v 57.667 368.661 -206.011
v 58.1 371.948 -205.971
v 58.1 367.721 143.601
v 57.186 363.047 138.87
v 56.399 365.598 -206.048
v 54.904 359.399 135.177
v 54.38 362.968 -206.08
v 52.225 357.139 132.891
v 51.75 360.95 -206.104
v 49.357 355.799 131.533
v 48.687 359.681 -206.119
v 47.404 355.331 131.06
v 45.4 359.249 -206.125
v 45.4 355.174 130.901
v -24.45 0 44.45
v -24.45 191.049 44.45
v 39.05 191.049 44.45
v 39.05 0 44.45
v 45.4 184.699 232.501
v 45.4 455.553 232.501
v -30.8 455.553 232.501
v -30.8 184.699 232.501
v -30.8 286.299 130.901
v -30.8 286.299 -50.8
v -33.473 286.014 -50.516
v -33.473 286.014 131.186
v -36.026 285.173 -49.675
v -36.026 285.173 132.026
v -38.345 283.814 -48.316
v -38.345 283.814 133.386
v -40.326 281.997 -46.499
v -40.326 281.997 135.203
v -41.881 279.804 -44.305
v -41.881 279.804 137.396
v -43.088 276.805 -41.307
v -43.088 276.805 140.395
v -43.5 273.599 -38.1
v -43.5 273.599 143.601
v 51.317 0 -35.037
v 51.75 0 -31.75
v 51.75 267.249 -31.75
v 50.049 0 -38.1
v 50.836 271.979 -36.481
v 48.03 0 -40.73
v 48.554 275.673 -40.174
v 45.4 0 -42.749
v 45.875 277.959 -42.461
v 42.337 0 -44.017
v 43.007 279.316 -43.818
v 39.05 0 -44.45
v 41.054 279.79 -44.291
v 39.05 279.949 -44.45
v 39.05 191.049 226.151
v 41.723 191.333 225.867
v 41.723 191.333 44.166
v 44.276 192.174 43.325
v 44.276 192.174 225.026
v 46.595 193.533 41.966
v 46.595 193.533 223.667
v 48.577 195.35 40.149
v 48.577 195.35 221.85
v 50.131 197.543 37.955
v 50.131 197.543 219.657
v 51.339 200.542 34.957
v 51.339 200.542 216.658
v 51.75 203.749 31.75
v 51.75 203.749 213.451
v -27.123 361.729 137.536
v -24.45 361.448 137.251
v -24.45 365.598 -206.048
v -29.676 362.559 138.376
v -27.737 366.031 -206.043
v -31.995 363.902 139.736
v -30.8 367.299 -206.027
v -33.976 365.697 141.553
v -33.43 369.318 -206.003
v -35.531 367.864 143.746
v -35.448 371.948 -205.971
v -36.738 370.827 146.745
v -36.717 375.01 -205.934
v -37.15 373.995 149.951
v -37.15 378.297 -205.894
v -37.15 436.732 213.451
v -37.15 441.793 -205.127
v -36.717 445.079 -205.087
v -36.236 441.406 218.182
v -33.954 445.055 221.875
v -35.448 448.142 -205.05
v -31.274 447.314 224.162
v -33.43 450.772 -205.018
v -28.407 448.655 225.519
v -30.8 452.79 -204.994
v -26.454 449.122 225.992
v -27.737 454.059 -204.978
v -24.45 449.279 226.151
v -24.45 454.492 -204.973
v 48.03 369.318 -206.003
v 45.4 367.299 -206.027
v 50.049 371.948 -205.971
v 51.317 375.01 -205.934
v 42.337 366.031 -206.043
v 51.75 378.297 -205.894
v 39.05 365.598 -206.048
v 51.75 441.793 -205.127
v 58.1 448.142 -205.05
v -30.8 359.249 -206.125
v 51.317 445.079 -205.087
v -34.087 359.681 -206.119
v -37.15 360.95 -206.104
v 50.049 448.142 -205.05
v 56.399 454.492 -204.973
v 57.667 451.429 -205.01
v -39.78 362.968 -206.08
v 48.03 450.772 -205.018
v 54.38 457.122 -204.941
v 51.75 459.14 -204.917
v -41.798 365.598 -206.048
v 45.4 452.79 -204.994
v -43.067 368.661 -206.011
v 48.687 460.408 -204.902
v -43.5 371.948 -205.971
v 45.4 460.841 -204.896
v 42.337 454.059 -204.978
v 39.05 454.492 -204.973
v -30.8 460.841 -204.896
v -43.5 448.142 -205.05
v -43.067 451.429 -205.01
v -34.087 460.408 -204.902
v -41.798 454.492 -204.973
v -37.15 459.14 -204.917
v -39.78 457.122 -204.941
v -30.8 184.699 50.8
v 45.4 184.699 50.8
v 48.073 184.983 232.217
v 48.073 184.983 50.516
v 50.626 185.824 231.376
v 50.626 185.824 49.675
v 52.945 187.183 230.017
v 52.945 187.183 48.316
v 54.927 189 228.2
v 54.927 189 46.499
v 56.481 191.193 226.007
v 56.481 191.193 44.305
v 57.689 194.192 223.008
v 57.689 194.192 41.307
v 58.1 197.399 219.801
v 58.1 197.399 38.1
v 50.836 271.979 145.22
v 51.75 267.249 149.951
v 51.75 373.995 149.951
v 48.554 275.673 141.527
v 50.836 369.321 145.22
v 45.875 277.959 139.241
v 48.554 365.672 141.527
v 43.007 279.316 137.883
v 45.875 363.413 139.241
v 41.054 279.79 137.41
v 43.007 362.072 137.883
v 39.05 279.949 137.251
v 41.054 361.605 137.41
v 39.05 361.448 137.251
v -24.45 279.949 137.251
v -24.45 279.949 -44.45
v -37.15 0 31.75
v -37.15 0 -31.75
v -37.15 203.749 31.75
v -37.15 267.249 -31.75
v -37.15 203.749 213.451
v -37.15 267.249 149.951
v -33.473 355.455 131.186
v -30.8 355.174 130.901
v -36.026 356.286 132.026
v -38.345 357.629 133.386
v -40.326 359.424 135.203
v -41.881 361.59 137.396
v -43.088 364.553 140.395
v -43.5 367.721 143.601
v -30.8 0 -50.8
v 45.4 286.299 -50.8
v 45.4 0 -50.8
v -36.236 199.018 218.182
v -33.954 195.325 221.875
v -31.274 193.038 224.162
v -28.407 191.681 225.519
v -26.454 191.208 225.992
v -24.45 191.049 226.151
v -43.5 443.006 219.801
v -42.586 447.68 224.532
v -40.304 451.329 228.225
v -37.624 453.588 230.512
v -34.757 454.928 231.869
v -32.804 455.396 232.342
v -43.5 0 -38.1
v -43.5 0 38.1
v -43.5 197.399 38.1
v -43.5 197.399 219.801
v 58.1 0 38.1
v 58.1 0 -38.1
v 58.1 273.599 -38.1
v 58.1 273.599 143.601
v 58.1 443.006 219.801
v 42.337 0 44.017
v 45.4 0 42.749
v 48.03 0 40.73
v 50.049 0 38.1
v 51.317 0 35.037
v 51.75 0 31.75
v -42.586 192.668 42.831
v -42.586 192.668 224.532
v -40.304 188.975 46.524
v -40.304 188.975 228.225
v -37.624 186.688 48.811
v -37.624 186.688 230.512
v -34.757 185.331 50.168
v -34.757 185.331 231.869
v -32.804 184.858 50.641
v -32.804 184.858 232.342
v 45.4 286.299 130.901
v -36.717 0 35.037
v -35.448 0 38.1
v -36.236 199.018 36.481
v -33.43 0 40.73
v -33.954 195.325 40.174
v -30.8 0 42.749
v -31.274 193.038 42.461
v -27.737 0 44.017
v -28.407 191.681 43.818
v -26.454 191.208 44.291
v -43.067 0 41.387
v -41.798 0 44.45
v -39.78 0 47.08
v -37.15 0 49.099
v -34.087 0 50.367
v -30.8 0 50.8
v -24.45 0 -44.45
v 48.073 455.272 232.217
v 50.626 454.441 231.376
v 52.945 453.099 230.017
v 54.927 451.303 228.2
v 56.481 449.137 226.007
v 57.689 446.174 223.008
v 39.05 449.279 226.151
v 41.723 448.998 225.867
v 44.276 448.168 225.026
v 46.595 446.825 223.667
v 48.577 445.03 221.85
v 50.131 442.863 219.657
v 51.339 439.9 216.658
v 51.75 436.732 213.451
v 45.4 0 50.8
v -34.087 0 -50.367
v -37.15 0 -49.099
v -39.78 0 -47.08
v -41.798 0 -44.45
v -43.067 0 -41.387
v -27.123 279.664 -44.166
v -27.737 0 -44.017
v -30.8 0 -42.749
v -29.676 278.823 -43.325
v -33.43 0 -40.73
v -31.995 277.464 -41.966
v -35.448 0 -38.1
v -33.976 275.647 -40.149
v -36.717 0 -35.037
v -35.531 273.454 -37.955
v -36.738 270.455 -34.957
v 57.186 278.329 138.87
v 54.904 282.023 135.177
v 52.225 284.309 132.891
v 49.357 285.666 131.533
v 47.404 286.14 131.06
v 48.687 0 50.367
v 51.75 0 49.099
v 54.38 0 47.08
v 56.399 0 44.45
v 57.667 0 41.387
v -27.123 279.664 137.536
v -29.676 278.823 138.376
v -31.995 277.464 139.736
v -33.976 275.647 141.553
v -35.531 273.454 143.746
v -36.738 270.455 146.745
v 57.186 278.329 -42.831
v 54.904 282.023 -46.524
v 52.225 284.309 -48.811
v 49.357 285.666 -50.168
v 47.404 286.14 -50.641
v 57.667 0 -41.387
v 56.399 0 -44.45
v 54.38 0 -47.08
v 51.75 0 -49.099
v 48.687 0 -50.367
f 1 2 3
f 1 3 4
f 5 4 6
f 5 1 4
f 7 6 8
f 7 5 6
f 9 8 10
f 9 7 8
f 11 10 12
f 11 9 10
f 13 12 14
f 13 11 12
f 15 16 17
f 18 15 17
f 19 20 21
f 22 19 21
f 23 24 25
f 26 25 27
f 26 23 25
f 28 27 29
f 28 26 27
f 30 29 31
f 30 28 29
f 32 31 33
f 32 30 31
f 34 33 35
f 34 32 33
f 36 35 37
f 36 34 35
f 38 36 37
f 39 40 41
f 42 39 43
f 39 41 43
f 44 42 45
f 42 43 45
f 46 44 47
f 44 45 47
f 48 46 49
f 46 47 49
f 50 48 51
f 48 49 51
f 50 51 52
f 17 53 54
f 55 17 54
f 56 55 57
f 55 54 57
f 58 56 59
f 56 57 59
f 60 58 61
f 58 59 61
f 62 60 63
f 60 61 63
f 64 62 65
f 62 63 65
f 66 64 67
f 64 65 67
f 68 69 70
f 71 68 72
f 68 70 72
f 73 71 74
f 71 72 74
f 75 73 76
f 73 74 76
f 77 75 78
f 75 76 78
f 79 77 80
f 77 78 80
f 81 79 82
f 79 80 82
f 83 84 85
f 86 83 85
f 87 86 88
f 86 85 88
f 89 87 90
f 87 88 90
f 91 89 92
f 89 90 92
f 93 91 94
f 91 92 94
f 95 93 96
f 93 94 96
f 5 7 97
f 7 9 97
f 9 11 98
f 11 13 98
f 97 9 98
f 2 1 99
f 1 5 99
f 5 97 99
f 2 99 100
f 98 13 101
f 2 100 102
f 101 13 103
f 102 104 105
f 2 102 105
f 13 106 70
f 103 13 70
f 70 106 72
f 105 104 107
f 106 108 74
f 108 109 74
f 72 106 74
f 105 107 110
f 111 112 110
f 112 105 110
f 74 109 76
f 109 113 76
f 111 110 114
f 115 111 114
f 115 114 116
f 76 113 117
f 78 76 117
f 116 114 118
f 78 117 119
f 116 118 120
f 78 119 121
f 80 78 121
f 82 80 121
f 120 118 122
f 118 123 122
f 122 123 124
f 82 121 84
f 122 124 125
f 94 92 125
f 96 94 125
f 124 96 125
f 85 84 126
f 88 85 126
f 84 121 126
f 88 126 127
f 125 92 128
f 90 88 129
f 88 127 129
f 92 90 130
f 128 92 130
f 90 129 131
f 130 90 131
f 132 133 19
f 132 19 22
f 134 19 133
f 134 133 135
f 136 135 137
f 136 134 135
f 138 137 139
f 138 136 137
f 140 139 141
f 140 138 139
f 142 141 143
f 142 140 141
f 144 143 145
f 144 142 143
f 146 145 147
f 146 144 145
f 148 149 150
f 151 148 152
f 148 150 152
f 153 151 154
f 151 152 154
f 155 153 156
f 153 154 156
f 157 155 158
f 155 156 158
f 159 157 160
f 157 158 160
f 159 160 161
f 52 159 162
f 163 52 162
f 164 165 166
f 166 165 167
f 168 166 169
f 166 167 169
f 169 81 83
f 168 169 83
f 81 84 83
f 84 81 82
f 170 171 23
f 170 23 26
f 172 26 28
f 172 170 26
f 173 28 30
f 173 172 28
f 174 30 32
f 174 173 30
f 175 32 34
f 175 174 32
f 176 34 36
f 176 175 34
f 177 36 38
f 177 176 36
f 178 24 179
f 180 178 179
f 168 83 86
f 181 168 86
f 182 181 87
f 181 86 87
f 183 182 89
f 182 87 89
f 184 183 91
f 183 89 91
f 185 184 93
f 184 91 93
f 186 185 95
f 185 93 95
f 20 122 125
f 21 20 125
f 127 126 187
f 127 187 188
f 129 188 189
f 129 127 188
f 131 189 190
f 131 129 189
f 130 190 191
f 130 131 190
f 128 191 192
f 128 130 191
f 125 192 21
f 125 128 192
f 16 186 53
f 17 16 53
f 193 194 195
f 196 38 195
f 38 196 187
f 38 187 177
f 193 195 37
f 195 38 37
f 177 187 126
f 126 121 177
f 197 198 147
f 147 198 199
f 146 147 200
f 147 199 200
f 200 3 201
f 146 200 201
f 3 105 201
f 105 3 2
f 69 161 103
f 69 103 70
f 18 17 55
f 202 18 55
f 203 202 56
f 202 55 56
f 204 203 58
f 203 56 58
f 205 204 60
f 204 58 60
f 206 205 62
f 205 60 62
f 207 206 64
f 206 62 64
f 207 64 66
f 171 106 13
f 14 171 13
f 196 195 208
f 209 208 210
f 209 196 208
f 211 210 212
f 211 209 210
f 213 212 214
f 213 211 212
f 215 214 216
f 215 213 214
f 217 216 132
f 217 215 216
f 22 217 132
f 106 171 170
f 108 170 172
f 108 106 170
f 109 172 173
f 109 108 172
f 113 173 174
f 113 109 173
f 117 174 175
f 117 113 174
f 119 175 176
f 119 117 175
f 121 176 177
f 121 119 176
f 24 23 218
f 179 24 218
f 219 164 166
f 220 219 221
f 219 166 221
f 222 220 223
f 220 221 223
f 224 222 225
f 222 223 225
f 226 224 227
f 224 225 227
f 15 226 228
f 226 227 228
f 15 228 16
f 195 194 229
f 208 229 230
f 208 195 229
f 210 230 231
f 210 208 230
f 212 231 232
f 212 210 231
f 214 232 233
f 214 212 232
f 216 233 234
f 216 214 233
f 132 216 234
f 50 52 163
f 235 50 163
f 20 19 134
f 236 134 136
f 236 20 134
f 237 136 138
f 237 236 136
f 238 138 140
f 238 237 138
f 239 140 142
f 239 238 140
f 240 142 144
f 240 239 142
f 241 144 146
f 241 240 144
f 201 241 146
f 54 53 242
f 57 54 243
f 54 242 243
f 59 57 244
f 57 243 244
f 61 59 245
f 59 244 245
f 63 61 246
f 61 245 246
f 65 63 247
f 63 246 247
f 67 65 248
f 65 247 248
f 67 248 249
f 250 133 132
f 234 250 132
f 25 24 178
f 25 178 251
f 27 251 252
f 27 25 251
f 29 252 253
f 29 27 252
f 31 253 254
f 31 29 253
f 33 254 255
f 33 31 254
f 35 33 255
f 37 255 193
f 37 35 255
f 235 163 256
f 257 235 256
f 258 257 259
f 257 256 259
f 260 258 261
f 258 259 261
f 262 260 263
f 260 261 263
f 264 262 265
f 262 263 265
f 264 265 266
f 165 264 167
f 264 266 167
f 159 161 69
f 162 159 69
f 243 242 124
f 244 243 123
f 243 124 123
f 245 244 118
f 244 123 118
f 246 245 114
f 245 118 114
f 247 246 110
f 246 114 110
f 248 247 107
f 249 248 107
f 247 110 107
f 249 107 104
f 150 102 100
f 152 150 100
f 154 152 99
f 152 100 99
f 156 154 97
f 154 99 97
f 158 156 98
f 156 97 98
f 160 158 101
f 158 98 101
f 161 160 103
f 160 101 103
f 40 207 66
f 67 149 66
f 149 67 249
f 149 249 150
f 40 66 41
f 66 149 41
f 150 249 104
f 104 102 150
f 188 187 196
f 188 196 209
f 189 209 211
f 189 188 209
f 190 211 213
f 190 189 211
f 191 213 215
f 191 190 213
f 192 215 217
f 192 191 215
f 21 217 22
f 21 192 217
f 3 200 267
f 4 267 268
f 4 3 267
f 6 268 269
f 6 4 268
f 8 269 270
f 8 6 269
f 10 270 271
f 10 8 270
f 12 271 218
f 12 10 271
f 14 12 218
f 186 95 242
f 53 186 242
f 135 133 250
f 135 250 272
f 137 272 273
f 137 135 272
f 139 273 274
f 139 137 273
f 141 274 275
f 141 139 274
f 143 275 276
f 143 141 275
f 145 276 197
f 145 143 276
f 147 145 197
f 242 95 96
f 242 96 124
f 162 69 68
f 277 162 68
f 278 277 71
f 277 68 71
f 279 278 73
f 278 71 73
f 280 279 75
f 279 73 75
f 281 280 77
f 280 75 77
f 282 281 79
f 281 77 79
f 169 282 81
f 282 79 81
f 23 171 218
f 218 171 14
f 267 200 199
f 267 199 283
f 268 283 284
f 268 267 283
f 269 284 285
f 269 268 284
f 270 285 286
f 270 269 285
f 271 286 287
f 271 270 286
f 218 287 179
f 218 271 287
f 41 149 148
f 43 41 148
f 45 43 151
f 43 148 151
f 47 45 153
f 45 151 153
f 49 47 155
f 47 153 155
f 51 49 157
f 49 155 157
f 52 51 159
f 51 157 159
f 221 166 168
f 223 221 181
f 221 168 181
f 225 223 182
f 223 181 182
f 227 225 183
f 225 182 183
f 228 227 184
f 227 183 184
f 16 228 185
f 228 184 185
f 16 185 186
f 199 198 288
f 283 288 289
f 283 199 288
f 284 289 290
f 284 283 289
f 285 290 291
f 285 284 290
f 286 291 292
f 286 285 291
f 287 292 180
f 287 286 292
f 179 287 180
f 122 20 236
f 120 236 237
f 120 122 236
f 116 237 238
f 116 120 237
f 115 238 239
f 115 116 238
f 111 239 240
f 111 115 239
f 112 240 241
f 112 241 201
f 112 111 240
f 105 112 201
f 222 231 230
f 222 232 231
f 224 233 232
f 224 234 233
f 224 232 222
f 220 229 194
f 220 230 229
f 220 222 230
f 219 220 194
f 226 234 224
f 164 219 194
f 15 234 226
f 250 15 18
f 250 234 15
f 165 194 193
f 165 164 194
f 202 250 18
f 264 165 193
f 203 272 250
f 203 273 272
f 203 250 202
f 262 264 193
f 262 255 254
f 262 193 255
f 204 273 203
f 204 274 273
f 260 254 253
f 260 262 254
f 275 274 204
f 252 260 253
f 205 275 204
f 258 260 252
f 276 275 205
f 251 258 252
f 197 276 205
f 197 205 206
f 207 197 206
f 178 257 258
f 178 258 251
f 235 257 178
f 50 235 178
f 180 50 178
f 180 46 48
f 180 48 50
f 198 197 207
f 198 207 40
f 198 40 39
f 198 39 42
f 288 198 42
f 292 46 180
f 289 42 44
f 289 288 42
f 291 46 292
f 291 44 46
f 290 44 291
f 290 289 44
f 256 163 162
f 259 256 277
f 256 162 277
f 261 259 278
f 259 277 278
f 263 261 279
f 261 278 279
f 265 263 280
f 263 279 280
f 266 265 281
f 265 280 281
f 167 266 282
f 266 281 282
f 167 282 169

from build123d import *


with BuildPart() as f2:
    # F2: sweep along a path in F1
    with BuildLine(Plane.YZ) as f2_path:
        Line((0, 0), (235.4986518621, 0))
        Line((235.4986518621, 0), (235.4986518621, 181.7011833191))
        Line((235.4986518621, 181.7011833191), (405.3635597229, 181.7011833191))
        Line((405.3635597229, 181.7011833191), (410.0448787212, -205.5106014013))
    # F0 (on Front) → F2 (sweep)
    with BuildSketch(Plane.XZ):
        with BuildLine():
            Line((-43.4998961684, 38.1), (-43.4998961684, -38.1))
            ThreePointArc((-43.4998961684, -38.1), (-39.7801522895, -47.0802561211), (-30.7998961684, -50.8))
            Line((-30.7998961684, -50.8), (45.4001038316, -50.8))
            ThreePointArc((45.4001038316, -50.8), (54.3803599527, -47.0802561211), (58.1001038316, -38.1))
            Line((58.1001038316, -38.1), (58.1001038316, 38.1))
            ThreePointArc((58.1001038316, 38.1), (54.3803599527, 47.0802561211), (45.4001038316, 50.8))
            Line((45.4001038316, 50.8), (-30.7998961684, 50.8))
            ThreePointArc((-30.7998961684, 50.8), (-39.7801522895, 47.0802561211), (-43.4998961684, 38.1))
        make_face()
        with BuildLine():
            ThreePointArc((-37.1498961684, 31.75), (-33.4301522895, 40.7302561211), (-24.4498961684, 44.45))
            Line((-24.4498961684, 44.45), (39.0501038316, 44.45))
            ThreePointArc((39.0501038316, 44.45), (48.0303599527, 40.7302561211), (51.7501038316, 31.75))
            Line((51.7501038316, 31.75), (51.7501038316, -31.75))
            ThreePointArc((51.7501038316, -31.75), (48.0303599527, -40.7302561211), (39.0501038316, -44.45))
            Line((39.0501038316, -44.45), (-24.4498961684, -44.45))
            ThreePointArc((-24.4498961684, -44.45), (-33.4301522895, -40.7302561211), (-37.1498961684, -31.75))
            Line((-37.1498961684, -31.75), (-37.1498961684, 31.75))
        make_face(mode=Mode.SUBTRACT)
    sweep(path=f2_path.line, transition=Transition.RIGHT)


solid = f2.part
